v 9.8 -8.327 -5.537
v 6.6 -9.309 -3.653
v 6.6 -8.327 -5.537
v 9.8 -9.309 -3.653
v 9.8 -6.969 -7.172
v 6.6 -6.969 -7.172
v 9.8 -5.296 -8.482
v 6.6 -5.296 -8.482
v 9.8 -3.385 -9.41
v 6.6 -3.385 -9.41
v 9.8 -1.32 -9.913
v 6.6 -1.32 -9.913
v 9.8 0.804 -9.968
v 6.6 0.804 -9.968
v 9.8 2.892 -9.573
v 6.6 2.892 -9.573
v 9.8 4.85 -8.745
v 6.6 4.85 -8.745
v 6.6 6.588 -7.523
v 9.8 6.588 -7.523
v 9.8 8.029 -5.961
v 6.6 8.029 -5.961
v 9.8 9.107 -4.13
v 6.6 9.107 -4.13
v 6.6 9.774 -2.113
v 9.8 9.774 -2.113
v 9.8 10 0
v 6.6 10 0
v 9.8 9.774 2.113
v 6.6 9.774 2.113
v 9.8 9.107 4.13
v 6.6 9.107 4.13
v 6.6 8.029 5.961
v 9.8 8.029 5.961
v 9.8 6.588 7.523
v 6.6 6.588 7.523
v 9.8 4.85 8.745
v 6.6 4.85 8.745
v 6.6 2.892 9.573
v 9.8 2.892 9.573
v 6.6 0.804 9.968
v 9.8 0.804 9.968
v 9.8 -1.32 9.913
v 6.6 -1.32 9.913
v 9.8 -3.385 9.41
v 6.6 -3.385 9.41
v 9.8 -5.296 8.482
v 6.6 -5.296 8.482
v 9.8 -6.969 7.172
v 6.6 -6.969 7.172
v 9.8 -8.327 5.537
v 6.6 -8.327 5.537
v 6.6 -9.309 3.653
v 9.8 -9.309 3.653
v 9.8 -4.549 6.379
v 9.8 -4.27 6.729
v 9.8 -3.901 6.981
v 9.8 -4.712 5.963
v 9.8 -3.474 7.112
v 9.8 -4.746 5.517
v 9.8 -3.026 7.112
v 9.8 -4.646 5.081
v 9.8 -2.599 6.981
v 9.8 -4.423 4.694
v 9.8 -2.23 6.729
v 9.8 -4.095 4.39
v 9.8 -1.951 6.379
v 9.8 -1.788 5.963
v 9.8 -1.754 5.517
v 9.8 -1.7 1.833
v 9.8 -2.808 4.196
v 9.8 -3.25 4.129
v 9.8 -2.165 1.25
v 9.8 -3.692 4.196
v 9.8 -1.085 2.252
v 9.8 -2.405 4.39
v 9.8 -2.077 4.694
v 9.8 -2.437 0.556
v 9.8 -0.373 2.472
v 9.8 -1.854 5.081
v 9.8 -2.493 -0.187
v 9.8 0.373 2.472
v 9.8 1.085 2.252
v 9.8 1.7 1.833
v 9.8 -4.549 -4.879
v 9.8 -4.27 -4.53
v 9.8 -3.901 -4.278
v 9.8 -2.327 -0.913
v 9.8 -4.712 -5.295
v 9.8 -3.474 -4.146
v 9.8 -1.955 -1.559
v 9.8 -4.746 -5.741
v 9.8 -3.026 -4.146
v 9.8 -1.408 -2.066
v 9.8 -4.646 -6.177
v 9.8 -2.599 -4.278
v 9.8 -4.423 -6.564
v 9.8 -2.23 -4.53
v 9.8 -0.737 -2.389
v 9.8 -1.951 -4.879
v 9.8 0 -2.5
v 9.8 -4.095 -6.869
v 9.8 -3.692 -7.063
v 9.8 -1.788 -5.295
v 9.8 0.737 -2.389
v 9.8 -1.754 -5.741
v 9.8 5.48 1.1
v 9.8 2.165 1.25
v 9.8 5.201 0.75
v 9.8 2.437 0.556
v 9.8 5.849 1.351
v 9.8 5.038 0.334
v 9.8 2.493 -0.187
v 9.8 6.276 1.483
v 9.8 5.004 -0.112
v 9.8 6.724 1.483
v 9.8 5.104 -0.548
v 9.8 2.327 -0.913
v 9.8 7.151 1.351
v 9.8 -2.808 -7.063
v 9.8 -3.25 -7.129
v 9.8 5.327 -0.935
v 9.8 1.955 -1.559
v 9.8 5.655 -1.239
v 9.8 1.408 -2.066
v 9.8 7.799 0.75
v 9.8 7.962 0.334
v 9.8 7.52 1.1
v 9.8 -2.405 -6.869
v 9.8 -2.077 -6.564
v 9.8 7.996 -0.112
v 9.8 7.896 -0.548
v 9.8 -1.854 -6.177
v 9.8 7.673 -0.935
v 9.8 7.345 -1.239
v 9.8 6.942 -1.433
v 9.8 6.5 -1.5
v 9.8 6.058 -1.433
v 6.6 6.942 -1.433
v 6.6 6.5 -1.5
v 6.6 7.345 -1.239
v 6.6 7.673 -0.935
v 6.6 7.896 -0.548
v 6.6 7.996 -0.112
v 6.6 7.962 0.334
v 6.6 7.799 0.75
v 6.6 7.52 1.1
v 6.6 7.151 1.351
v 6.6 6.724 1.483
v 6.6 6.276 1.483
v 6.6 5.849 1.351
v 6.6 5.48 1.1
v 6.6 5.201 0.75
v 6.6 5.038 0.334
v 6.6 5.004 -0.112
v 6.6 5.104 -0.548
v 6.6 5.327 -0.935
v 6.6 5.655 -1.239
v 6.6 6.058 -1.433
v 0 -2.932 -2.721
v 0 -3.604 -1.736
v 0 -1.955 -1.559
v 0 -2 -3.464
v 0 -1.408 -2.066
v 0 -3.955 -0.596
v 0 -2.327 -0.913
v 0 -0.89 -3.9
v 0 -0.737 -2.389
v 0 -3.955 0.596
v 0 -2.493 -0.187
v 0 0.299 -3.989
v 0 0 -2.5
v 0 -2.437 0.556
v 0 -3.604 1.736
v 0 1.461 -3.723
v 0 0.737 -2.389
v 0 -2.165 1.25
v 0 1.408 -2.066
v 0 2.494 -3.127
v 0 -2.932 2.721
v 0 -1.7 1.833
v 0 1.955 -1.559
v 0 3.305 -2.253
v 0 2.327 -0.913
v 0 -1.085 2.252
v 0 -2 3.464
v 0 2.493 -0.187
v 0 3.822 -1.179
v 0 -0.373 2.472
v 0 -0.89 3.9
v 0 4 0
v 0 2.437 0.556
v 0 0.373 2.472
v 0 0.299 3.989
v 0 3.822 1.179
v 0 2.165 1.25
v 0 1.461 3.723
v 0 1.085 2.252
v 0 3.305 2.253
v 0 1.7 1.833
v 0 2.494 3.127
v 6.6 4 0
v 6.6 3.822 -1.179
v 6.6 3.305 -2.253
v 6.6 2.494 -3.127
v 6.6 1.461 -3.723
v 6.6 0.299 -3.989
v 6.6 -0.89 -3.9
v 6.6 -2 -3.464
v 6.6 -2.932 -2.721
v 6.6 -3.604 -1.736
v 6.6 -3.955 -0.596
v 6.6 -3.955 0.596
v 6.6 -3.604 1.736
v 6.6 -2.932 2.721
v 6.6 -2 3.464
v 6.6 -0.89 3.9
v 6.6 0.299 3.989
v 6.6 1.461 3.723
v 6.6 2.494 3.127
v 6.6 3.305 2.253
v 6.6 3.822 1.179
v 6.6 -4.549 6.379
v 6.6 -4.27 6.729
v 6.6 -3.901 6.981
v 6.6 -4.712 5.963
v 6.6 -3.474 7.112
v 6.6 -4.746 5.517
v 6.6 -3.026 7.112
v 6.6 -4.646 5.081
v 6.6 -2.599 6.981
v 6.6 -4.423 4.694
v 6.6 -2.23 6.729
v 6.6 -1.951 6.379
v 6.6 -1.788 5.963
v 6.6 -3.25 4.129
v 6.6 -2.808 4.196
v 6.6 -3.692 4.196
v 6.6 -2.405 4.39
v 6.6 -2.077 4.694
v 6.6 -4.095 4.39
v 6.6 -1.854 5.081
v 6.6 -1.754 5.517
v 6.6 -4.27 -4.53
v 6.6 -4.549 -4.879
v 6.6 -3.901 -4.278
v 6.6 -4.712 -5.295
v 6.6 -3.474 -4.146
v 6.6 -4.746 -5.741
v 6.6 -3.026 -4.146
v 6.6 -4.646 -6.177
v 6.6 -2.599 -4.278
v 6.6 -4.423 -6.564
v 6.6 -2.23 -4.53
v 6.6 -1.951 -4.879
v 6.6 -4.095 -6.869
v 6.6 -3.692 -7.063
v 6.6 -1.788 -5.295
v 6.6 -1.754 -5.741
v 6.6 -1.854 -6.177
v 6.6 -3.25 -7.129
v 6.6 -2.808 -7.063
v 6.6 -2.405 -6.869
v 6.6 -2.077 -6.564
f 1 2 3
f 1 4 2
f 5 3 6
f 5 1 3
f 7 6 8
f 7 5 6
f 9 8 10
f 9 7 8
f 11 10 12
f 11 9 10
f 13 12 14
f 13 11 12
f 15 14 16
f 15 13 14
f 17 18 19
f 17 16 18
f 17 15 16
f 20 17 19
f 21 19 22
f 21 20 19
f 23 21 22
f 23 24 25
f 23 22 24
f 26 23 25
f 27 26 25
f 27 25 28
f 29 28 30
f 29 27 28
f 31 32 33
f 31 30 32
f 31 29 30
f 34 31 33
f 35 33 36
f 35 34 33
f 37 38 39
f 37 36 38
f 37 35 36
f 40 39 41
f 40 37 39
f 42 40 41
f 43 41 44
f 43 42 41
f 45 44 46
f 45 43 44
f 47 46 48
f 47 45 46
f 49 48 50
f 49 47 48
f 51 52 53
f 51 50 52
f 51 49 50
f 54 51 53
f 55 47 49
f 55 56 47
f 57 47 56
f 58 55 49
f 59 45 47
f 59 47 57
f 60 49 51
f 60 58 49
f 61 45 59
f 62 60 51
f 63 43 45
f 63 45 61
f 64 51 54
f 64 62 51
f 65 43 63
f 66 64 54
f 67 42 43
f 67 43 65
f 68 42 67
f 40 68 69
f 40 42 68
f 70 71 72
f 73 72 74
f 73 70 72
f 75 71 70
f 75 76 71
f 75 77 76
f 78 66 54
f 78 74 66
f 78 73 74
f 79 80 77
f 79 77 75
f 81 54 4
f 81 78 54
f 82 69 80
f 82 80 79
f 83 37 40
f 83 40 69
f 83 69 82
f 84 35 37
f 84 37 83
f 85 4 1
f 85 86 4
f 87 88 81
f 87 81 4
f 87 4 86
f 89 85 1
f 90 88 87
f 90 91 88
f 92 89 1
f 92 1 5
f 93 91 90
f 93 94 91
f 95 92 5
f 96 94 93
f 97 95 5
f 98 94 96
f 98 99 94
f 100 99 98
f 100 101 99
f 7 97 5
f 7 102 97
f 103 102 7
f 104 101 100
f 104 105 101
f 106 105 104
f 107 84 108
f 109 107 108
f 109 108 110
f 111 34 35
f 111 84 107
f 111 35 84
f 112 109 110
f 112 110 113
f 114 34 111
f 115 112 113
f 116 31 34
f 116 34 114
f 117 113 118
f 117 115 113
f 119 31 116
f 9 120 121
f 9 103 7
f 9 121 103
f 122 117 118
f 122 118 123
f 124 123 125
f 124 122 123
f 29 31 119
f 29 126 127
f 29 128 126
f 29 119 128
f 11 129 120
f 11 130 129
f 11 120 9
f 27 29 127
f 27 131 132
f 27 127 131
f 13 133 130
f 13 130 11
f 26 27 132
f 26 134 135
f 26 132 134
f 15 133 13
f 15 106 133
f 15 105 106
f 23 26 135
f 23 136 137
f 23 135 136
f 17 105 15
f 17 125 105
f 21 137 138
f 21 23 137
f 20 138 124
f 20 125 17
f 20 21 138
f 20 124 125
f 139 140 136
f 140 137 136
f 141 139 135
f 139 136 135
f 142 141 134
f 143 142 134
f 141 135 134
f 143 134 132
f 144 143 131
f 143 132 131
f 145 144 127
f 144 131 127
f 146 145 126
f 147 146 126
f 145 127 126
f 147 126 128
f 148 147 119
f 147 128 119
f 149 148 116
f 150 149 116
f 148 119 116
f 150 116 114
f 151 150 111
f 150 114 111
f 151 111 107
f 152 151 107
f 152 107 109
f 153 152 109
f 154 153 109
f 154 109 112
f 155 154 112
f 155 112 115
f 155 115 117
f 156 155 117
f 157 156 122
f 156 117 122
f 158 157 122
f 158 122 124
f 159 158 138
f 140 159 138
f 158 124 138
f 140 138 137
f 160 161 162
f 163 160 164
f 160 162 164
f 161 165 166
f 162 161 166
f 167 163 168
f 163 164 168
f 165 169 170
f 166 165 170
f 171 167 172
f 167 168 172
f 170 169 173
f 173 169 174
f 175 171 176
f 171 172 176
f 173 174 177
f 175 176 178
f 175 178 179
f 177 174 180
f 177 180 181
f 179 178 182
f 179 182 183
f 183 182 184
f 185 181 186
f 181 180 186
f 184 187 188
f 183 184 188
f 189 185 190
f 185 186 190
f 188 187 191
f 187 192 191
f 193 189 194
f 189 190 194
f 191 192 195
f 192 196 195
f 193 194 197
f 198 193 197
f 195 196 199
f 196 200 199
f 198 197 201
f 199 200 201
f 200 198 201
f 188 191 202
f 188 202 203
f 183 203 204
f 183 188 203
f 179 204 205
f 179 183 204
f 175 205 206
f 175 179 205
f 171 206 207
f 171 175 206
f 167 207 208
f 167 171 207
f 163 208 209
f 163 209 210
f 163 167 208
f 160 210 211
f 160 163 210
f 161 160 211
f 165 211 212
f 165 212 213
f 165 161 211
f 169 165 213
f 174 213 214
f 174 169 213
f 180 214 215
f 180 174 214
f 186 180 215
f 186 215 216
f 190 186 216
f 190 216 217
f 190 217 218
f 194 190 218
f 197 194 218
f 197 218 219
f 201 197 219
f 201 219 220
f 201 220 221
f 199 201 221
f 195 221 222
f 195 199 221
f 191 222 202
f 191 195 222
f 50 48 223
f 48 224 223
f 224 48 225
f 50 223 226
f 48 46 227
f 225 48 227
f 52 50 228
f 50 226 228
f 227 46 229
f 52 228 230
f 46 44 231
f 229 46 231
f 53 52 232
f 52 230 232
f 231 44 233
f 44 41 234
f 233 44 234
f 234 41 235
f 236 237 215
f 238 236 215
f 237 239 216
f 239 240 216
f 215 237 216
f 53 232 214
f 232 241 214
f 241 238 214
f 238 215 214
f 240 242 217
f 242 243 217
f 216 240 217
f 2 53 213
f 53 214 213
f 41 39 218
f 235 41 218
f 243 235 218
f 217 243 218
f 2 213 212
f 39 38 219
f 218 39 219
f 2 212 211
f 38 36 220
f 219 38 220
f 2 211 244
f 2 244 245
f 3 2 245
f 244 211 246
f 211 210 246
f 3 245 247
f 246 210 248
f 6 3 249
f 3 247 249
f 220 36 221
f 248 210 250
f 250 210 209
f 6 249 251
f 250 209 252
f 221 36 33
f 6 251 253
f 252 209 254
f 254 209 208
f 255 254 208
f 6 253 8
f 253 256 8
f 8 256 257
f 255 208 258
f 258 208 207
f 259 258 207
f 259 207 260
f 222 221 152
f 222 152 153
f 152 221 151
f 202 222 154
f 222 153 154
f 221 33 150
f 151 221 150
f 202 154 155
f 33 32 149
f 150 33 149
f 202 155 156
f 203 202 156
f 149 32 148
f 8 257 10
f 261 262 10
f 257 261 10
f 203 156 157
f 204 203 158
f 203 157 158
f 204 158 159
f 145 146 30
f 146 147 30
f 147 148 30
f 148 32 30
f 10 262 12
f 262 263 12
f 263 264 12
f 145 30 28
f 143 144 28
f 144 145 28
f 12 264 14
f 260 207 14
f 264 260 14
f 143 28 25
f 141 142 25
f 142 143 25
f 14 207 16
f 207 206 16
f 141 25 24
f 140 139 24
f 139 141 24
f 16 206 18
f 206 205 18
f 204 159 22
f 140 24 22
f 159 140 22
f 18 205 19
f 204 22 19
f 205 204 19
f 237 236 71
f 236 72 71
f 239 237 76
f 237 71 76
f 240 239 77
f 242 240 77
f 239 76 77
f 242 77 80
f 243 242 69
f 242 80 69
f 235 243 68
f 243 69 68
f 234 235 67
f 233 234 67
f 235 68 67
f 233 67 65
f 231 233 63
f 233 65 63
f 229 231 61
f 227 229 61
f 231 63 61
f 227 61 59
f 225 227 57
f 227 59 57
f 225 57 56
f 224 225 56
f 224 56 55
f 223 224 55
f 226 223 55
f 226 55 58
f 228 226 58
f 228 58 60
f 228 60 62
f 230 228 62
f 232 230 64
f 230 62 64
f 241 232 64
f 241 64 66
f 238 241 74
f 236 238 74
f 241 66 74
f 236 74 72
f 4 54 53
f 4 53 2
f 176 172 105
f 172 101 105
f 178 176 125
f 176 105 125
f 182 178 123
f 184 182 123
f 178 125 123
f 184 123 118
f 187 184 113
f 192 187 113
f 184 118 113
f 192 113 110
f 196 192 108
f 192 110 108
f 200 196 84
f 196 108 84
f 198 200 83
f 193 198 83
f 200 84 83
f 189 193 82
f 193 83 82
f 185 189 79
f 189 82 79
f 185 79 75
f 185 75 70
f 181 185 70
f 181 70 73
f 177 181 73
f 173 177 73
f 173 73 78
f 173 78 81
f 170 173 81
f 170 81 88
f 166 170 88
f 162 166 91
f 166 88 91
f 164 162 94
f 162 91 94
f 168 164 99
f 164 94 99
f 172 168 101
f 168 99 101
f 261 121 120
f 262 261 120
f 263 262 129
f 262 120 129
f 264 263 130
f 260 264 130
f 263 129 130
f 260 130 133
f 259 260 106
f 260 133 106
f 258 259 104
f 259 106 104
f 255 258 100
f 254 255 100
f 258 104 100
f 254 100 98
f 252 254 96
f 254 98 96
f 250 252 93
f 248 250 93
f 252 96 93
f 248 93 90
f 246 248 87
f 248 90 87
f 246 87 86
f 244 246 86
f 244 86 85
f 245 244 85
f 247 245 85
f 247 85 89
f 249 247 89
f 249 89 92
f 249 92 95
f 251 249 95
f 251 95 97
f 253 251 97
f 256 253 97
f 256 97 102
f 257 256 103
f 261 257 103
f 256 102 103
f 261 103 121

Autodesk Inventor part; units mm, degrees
ref_plane "YZ Plane" through (0, 0, 0) normal (1, 0, 0) x (0, 1, 0)
ref_plane "XZ Plane" through (0, 0, 0) normal (0, 1, 0) x (-1, 0, 0)
ref_plane "XY Plane" through (0, 0, 0) normal (0, 0, 1) x (1, 0, 0)
sketch "Sketch1" plane through (0, 0, 0) normal (1, 0, 0) x (0, 1, 0)
  circle A0 centre (0, 0) radius 4
  dimension "d0" = 8
extrude "Extrusion1" add sketch "Sketch1" along normal blind 9.8
sketch "Sketch2" plane through (9.8, 0, 0) normal (1, 0, 0) x (0, 0, -1)
  circle A0 centre (0, 0) radius 10
  circle A1 centre (0, 0) radius 6.5 construction
  circle A2 centre (0, 6.5) radius 1.5
  circle A3 centre (-5.6292, -3.25) radius 1.5
  circle A4 centre (5.6292, -3.25) radius 1.5
  dimension "d4" = 13
  dimension "d3" = 20
  dimension "d5" = 3
  dimension "d8" = 360
extrude "Extrusion2" add sketch "Sketch2" against normal blind 3.2
sketch "Sketch3" plane through (9.8, 0, 0) normal (1, 0, 0) x (0, 0, -1)
  circle A0 centre (0, 0) radius 2.5
  dimension "d12" = 5
extrude "Extrusion3" cut sketch "Sketch3" against normal through all
sketch "Sketch4" plane through (9.8, 0, 0) normal (1, 0, 0) x (0, 0, -1)
  line L0 (8.1454, -10.691) -> (-8.1454, -10.691)
  line L1 (-8.1454, -10.691) -> (-8.1454, -9.309)
  line L2 (-8.1454, -9.309) -> (8.1454, -9.309)
  line L3 (8.1454, -9.309) -> (8.1454, -10.691)
  circle A0 centre (0, 0) radius 10 projected
  line L4 (8.1454, -10.691) -> (-8.1454, -9.309) construction
  line L5 (-8.1454, -10.691) -> (8.1454, -9.309) construction
  point P0 (0, -10)
extrude "Extrusion4" cut sketch "Sketch4" against normal through all contours L0 L1 L2 A0 L3 | A0 L2 picked at (-0.4144, -9.5135)
properties part number "Nut"
